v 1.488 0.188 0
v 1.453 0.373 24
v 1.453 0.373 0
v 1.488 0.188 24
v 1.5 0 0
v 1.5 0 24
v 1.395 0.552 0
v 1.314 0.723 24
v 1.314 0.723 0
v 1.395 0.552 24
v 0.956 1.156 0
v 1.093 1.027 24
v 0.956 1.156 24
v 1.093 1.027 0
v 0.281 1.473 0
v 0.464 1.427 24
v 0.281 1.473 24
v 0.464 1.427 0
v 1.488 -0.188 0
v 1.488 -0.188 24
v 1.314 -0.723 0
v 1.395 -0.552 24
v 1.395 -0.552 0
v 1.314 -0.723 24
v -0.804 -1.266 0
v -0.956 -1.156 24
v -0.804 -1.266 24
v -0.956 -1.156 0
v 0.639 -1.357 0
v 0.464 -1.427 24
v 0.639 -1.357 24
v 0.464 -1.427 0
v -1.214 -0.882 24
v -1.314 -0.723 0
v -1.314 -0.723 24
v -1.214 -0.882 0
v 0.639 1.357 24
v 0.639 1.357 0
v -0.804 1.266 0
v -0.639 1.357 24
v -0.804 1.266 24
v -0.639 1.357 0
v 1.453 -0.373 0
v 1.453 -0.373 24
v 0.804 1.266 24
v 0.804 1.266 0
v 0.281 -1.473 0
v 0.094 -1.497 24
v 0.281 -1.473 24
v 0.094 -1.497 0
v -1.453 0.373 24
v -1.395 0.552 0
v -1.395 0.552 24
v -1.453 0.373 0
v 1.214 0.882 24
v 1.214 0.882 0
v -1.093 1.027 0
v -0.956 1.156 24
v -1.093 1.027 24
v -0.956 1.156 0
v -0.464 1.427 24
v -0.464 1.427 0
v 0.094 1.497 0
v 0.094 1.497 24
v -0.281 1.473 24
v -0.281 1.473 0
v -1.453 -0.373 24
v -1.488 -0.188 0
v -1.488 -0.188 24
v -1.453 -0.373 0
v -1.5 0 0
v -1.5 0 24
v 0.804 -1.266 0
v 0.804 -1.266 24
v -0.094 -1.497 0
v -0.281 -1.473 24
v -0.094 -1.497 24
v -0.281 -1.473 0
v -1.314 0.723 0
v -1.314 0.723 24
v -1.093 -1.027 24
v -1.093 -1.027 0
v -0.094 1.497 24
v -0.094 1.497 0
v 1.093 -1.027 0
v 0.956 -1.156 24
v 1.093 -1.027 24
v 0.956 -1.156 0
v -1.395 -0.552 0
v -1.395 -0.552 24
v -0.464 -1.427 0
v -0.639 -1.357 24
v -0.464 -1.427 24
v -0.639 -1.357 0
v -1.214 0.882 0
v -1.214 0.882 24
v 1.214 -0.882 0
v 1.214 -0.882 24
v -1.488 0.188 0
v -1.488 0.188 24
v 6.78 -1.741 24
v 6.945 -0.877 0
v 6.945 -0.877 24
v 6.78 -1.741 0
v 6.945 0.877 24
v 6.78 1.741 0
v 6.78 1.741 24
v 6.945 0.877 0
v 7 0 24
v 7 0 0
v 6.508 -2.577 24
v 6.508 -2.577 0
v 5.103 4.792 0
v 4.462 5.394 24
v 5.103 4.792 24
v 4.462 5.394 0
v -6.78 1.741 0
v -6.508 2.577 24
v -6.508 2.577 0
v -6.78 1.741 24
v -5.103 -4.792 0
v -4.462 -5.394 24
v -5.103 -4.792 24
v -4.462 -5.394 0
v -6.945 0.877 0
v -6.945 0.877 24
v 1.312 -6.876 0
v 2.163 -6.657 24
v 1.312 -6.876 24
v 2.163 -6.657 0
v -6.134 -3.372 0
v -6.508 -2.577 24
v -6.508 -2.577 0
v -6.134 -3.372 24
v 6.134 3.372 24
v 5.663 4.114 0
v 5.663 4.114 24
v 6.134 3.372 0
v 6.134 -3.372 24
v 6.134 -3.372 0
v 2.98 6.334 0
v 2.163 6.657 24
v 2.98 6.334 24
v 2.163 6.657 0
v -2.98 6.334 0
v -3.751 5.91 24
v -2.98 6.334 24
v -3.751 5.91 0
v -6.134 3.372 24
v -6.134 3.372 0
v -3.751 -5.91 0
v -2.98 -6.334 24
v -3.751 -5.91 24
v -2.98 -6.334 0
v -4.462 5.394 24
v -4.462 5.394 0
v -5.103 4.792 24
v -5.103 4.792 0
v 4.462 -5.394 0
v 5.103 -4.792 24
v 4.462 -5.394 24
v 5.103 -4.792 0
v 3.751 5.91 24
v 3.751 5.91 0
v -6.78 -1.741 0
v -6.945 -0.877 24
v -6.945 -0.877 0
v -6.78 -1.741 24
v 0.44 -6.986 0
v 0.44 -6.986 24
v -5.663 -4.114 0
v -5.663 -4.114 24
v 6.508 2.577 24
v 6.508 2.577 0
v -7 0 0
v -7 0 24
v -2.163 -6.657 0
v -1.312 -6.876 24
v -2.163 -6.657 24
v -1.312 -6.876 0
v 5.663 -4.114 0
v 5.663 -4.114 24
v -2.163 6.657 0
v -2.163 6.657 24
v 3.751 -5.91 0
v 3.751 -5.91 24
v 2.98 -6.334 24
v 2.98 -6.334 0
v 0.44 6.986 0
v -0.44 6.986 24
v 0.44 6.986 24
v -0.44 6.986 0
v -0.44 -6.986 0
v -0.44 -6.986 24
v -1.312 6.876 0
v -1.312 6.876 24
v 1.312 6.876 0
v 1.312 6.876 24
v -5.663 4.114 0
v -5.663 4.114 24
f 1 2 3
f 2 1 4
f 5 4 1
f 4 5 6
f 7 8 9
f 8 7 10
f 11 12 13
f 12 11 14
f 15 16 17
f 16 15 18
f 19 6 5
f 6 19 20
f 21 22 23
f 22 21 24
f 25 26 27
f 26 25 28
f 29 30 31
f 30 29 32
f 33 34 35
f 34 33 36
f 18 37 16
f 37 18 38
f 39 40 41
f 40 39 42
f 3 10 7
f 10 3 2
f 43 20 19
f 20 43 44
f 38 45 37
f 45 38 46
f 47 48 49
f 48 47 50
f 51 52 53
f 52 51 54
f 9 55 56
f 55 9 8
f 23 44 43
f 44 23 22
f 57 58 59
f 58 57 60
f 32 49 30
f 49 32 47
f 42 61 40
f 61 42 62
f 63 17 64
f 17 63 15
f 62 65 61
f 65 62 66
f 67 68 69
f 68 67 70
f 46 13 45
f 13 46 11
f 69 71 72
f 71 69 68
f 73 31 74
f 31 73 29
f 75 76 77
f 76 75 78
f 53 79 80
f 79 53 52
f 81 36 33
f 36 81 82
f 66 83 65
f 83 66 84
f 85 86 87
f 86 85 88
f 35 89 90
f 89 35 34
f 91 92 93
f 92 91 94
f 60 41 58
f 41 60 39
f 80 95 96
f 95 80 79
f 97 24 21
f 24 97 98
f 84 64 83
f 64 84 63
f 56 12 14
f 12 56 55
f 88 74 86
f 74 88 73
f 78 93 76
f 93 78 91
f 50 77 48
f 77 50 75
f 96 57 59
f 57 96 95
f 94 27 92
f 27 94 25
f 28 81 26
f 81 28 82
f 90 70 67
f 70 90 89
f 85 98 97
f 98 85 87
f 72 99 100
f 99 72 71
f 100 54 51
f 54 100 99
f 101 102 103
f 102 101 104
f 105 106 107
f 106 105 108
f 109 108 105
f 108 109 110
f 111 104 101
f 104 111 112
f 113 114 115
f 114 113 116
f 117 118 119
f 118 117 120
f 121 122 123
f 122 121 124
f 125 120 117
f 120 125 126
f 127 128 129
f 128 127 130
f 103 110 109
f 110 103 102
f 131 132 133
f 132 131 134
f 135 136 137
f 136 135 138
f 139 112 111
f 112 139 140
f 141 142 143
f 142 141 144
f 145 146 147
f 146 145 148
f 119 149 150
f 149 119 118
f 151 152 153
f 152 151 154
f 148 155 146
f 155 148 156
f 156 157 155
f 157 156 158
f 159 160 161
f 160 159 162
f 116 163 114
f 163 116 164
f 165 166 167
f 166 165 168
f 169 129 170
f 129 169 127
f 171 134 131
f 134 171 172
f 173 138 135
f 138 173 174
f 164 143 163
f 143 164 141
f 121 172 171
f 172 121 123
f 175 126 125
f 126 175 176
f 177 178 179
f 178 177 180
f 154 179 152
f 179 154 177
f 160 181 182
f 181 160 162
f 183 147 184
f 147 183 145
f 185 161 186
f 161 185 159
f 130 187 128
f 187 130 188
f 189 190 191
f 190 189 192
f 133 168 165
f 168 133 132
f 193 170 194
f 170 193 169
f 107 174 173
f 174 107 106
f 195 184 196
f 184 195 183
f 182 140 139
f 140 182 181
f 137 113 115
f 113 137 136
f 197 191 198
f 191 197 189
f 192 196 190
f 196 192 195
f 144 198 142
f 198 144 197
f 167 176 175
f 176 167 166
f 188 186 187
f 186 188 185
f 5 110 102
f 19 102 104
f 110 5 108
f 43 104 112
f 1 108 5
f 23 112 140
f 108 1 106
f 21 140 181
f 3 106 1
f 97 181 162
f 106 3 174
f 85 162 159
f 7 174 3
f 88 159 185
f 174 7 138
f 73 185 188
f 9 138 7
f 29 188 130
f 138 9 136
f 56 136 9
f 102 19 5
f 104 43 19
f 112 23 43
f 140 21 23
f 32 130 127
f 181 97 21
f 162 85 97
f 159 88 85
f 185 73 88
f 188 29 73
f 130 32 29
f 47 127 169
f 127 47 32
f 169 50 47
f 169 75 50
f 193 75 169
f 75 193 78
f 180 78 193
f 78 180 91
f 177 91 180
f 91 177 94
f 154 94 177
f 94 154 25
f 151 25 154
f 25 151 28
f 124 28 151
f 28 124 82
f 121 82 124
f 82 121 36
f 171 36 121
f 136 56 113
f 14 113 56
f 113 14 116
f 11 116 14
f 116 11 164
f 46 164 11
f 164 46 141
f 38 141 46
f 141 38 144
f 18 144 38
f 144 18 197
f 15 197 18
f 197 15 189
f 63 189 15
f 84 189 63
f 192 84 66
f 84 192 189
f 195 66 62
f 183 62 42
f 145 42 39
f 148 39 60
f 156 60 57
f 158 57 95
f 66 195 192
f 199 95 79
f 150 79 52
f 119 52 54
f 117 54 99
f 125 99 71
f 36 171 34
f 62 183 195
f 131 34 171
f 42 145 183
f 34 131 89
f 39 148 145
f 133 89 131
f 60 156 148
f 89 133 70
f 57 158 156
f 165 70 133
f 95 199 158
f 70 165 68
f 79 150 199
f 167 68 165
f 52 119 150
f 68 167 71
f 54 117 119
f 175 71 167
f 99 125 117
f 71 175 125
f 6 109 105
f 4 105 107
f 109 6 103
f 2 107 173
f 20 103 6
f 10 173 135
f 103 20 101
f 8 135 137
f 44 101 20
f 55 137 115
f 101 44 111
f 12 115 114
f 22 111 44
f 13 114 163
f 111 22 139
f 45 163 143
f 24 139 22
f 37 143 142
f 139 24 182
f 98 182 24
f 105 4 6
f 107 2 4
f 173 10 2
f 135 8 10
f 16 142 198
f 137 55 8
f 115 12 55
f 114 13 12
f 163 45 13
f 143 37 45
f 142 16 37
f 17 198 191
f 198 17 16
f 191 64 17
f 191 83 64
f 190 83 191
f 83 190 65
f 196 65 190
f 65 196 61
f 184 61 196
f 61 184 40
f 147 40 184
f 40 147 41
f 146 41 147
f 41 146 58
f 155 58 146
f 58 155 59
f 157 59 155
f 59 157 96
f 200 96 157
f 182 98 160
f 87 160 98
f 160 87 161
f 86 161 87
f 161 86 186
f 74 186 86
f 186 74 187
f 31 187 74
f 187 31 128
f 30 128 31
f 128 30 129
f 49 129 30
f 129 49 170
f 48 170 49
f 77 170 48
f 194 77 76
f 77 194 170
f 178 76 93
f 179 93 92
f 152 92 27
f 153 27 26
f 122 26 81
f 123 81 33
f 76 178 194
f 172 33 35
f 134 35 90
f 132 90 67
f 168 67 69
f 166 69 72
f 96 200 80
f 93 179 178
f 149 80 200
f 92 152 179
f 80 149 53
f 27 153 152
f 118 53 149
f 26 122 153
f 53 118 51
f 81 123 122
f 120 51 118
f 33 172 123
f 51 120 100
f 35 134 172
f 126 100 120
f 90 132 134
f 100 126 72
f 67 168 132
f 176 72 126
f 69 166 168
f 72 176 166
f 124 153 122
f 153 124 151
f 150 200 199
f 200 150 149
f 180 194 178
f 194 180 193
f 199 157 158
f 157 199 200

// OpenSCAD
$fn = 50;


difference() {
	union() {
		cylinder(h = 24, r = 7.0000000000);
	}
	union() {
		translate(v = [0, 0, -100]) {
			cylinder(h = 200, r = 1.5000000000);
		}
		translate(v = [0, 0, -100]) {
			cylinder(h = 200, r = 1.5000000000);
		}
	}
}
